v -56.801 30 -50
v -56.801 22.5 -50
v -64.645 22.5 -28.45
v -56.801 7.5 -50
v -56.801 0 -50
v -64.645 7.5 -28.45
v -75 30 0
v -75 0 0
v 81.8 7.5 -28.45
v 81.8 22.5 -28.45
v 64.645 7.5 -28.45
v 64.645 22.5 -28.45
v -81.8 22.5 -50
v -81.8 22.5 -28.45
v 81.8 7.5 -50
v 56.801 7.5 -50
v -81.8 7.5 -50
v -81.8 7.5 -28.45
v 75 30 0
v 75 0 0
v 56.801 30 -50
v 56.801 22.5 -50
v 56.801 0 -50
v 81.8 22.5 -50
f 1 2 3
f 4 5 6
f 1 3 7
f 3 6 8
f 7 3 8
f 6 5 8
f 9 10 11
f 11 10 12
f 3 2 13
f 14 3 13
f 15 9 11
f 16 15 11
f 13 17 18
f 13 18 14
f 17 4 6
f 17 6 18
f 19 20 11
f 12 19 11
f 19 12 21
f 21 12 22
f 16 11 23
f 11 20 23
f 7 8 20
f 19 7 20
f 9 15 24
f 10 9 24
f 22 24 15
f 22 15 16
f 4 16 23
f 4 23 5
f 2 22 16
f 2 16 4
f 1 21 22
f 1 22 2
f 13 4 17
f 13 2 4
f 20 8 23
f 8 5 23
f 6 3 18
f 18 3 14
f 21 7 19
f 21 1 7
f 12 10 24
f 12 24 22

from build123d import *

# Parameters (mm, degrees)
SALIENTE_EXTRUIR4_DEPTH = 30
CROQUIS6_W              = 163.6
CROQUIS6_H              = 15
SALIENTE_EXTRUIR6_DEPTH = 21.55


with BuildPart() as part:
    # Croquis3 → Saliente-Extruir4 (new body)
    with BuildSketch(Plane(origin=(0, 0, 0), x_dir=(1, 0, 0), z_dir=(0, 1, 0))):
        Polygon((-75, 0), (75, 0), (56.801488287, 50), (-56.801488287, 50), align=None)
    extrude(amount=SALIENTE_EXTRUIR4_DEPTH)

    # Croquis6 → Saliente-Extruir6 (add)
    with BuildSketch(Plane(origin=(0, 0, -50), x_dir=(-1, 0, 0), z_dir=(0, 0, -1))):
        with Locations((0, 15)):
            Rectangle(CROQUIS6_W, CROQUIS6_H)
    extrude(amount=-SALIENTE_EXTRUIR6_DEPTH)


solid = part.part
